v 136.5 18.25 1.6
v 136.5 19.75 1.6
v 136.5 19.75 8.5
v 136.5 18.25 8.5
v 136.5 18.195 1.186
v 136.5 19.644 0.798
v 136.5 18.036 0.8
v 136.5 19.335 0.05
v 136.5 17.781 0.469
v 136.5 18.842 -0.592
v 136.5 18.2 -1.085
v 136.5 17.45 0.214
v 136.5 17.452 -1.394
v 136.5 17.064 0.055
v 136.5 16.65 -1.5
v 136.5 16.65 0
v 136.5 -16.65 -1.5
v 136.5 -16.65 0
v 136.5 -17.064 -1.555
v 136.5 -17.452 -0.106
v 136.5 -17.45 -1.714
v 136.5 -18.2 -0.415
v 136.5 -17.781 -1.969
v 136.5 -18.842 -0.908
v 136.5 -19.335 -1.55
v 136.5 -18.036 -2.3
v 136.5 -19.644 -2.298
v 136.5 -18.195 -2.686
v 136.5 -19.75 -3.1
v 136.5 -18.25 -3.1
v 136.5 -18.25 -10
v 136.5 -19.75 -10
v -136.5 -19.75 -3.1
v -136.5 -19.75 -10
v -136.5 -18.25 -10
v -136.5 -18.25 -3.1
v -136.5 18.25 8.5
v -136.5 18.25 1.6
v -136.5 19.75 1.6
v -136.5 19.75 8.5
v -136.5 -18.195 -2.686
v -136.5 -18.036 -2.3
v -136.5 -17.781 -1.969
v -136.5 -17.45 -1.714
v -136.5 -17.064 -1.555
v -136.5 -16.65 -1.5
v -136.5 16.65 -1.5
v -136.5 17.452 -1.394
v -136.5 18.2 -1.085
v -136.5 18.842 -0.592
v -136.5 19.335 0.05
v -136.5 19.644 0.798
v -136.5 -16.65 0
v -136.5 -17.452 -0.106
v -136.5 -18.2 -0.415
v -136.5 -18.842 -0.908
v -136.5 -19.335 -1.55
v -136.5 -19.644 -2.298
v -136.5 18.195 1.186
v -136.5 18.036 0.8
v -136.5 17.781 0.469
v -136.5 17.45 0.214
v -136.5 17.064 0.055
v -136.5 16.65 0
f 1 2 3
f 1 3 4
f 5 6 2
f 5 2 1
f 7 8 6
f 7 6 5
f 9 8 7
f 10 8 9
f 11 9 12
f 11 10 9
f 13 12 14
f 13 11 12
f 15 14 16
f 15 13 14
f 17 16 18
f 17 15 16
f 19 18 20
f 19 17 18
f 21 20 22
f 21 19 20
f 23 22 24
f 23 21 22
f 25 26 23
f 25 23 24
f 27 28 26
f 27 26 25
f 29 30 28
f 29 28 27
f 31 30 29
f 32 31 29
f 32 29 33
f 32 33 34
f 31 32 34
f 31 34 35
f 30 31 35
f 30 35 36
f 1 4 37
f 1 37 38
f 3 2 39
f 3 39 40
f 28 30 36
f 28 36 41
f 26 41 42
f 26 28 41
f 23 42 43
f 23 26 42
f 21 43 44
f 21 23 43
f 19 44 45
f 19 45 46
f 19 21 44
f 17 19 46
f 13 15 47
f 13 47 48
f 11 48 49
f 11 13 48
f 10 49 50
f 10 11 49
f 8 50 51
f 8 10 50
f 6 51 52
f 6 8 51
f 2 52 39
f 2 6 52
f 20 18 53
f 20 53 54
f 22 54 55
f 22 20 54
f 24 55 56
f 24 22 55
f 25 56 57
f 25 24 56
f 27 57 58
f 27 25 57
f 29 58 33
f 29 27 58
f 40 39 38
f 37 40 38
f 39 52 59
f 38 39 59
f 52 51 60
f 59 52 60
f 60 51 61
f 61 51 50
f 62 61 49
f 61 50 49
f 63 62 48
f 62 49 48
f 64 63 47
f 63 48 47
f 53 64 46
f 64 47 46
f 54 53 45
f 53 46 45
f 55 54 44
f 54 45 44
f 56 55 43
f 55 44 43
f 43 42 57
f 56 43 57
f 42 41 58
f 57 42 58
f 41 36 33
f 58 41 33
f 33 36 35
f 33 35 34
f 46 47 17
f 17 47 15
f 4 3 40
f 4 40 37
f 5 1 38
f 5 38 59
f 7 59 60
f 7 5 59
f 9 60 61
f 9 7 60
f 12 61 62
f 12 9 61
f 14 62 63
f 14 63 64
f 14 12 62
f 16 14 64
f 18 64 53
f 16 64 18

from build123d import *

# Parameters (mm, degrees)
SKETCH1_W                    = 273
SKETCH1_H                    = 39.5
BASE_FLANGE1_DEPTH           = 1.5
EDGE_FLANGE1_STRIP_W         = 9.2
EDGE_FLANGE1_STRIP_H         = 1.5
EDGE_FLANGE1_STRIP_CUT_DEPTH = 273
EDGE_FLANGE1_DEPTH           = 273
EDGE_FLANGE2_STRIP_W         = 9.2
EDGE_FLANGE2_STRIP_H         = 1.5
EDGE_FLANGE2_STRIP_CUT_DEPTH = 273
EDGE_FLANGE2_DEPTH           = 273


# Sheet-metal steps are written as plain solids
with BuildPart() as part:
    # Sketch1 → Base-Flange1 (new body)
    with BuildSketch(Plane.XY):
        Rectangle(SKETCH1_W, SKETCH1_H)
    extrude(amount=-BASE_FLANGE1_DEPTH)

    # Edge-Flange1 strip (across the edge) → Edge-Flange1 strip cut (cut)
    with BuildSketch(Plane(origin=(136.5, 19.75, 0), x_dir=(0, -1, 0), z_dir=(-1, 0, 0))):
        with Locations((-1.5, -0.75)):
            Rectangle(EDGE_FLANGE1_STRIP_W, EDGE_FLANGE1_STRIP_H)
    extrude(amount=EDGE_FLANGE1_STRIP_CUT_DEPTH, mode=Mode.SUBTRACT)

    # Edge-Flange1 section (across the edge) → Edge-Flange1 (add)
    with BuildSketch(Plane(origin=(136.5, 19.75, 0), x_dir=(0, -1, 0), z_dir=(-1, 0, 0))):
        with BuildLine():
            Line((0, 1.6), (0, 8.5))
            Line((0, 8.5), (1.5, 8.5))
            Line((1.5, 8.5), (1.5, 1.6))
            ThreePointArc((1.5, 1.6), (1.96862915, 0.46862915), (3.1, 0))
            Line((3.1, 0), (3.1, -1.5))
            ThreePointArc((3.1, -1.5), (0.907968978, -0.592031022), (0, 1.6))
        make_face()
    extrude(amount=EDGE_FLANGE1_DEPTH)

    # Edge-Flange2 strip (across the edge) → Edge-Flange2 strip cut (cut)
    with BuildSketch(Plane(origin=(136.5, -19.75, -1.5), x_dir=(0, 1, 0), z_dir=(-1, 0, 0))):
        with Locations((-1.5, -0.75)):
            Rectangle(EDGE_FLANGE2_STRIP_W, EDGE_FLANGE2_STRIP_H)
    extrude(amount=EDGE_FLANGE2_STRIP_CUT_DEPTH, mode=Mode.SUBTRACT)

    # Edge-Flange2 section (across the edge) → Edge-Flange2 (add)
    with BuildSketch(Plane(origin=(136.5, -19.75, -1.5), x_dir=(0, 1, 0), z_dir=(-1, 0, 0))):
        with BuildLine():
            Line((0, 1.6), (0, 8.5))
            Line((0, 8.5), (1.5, 8.5))
            Line((1.5, 8.5), (1.5, 1.6))
            ThreePointArc((1.5, 1.6), (1.96862915, 0.46862915), (3.1, 0))
            Line((3.1, 0), (3.1, -1.5))
            ThreePointArc((3.1, -1.5), (0.907968978, -0.592031022), (0, 1.6))
        make_face()
    extrude(amount=EDGE_FLANGE2_DEPTH)


solid = part.part
